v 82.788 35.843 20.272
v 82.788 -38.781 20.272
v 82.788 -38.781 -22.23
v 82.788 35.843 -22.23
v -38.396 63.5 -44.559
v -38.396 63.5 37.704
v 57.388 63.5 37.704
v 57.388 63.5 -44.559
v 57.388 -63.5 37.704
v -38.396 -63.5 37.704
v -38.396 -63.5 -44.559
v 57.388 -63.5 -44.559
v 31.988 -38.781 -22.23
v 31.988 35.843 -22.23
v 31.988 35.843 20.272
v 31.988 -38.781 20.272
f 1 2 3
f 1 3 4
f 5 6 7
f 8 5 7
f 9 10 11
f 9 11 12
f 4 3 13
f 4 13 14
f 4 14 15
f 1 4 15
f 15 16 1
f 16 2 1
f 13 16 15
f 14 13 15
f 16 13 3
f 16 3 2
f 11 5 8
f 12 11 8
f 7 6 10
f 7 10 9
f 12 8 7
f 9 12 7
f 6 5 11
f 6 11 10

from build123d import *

# Parameters (mm, degrees)
F0_W     = 95.7834
F0_H     = 82.262423
F1_DEPTH = 63.5
F2_W     = 74.623767
F2_H     = 42.502253
F3_DEPTH = 25.4


with BuildPart() as f1:
    # F0 (on Front) → F1 (new body, symmetric)
    with BuildSketch(Plane.XZ):
        with Locations((9.496133, -3.427601)):
            Rectangle(F0_W, F0_H)
    extrude(amount=F1_DEPTH, both=True)


with BuildPart() as f3:
    # F2 (on face) → F3 (new body, symmetric)
    with BuildSketch(Plane.YZ.offset(57.387833)):
        with Locations((-1.468974, -0.979314)):
            Rectangle(F2_W, F2_H)
    extrude(amount=F3_DEPTH, both=True)


solid = Compound([f1.part, f3.part])
